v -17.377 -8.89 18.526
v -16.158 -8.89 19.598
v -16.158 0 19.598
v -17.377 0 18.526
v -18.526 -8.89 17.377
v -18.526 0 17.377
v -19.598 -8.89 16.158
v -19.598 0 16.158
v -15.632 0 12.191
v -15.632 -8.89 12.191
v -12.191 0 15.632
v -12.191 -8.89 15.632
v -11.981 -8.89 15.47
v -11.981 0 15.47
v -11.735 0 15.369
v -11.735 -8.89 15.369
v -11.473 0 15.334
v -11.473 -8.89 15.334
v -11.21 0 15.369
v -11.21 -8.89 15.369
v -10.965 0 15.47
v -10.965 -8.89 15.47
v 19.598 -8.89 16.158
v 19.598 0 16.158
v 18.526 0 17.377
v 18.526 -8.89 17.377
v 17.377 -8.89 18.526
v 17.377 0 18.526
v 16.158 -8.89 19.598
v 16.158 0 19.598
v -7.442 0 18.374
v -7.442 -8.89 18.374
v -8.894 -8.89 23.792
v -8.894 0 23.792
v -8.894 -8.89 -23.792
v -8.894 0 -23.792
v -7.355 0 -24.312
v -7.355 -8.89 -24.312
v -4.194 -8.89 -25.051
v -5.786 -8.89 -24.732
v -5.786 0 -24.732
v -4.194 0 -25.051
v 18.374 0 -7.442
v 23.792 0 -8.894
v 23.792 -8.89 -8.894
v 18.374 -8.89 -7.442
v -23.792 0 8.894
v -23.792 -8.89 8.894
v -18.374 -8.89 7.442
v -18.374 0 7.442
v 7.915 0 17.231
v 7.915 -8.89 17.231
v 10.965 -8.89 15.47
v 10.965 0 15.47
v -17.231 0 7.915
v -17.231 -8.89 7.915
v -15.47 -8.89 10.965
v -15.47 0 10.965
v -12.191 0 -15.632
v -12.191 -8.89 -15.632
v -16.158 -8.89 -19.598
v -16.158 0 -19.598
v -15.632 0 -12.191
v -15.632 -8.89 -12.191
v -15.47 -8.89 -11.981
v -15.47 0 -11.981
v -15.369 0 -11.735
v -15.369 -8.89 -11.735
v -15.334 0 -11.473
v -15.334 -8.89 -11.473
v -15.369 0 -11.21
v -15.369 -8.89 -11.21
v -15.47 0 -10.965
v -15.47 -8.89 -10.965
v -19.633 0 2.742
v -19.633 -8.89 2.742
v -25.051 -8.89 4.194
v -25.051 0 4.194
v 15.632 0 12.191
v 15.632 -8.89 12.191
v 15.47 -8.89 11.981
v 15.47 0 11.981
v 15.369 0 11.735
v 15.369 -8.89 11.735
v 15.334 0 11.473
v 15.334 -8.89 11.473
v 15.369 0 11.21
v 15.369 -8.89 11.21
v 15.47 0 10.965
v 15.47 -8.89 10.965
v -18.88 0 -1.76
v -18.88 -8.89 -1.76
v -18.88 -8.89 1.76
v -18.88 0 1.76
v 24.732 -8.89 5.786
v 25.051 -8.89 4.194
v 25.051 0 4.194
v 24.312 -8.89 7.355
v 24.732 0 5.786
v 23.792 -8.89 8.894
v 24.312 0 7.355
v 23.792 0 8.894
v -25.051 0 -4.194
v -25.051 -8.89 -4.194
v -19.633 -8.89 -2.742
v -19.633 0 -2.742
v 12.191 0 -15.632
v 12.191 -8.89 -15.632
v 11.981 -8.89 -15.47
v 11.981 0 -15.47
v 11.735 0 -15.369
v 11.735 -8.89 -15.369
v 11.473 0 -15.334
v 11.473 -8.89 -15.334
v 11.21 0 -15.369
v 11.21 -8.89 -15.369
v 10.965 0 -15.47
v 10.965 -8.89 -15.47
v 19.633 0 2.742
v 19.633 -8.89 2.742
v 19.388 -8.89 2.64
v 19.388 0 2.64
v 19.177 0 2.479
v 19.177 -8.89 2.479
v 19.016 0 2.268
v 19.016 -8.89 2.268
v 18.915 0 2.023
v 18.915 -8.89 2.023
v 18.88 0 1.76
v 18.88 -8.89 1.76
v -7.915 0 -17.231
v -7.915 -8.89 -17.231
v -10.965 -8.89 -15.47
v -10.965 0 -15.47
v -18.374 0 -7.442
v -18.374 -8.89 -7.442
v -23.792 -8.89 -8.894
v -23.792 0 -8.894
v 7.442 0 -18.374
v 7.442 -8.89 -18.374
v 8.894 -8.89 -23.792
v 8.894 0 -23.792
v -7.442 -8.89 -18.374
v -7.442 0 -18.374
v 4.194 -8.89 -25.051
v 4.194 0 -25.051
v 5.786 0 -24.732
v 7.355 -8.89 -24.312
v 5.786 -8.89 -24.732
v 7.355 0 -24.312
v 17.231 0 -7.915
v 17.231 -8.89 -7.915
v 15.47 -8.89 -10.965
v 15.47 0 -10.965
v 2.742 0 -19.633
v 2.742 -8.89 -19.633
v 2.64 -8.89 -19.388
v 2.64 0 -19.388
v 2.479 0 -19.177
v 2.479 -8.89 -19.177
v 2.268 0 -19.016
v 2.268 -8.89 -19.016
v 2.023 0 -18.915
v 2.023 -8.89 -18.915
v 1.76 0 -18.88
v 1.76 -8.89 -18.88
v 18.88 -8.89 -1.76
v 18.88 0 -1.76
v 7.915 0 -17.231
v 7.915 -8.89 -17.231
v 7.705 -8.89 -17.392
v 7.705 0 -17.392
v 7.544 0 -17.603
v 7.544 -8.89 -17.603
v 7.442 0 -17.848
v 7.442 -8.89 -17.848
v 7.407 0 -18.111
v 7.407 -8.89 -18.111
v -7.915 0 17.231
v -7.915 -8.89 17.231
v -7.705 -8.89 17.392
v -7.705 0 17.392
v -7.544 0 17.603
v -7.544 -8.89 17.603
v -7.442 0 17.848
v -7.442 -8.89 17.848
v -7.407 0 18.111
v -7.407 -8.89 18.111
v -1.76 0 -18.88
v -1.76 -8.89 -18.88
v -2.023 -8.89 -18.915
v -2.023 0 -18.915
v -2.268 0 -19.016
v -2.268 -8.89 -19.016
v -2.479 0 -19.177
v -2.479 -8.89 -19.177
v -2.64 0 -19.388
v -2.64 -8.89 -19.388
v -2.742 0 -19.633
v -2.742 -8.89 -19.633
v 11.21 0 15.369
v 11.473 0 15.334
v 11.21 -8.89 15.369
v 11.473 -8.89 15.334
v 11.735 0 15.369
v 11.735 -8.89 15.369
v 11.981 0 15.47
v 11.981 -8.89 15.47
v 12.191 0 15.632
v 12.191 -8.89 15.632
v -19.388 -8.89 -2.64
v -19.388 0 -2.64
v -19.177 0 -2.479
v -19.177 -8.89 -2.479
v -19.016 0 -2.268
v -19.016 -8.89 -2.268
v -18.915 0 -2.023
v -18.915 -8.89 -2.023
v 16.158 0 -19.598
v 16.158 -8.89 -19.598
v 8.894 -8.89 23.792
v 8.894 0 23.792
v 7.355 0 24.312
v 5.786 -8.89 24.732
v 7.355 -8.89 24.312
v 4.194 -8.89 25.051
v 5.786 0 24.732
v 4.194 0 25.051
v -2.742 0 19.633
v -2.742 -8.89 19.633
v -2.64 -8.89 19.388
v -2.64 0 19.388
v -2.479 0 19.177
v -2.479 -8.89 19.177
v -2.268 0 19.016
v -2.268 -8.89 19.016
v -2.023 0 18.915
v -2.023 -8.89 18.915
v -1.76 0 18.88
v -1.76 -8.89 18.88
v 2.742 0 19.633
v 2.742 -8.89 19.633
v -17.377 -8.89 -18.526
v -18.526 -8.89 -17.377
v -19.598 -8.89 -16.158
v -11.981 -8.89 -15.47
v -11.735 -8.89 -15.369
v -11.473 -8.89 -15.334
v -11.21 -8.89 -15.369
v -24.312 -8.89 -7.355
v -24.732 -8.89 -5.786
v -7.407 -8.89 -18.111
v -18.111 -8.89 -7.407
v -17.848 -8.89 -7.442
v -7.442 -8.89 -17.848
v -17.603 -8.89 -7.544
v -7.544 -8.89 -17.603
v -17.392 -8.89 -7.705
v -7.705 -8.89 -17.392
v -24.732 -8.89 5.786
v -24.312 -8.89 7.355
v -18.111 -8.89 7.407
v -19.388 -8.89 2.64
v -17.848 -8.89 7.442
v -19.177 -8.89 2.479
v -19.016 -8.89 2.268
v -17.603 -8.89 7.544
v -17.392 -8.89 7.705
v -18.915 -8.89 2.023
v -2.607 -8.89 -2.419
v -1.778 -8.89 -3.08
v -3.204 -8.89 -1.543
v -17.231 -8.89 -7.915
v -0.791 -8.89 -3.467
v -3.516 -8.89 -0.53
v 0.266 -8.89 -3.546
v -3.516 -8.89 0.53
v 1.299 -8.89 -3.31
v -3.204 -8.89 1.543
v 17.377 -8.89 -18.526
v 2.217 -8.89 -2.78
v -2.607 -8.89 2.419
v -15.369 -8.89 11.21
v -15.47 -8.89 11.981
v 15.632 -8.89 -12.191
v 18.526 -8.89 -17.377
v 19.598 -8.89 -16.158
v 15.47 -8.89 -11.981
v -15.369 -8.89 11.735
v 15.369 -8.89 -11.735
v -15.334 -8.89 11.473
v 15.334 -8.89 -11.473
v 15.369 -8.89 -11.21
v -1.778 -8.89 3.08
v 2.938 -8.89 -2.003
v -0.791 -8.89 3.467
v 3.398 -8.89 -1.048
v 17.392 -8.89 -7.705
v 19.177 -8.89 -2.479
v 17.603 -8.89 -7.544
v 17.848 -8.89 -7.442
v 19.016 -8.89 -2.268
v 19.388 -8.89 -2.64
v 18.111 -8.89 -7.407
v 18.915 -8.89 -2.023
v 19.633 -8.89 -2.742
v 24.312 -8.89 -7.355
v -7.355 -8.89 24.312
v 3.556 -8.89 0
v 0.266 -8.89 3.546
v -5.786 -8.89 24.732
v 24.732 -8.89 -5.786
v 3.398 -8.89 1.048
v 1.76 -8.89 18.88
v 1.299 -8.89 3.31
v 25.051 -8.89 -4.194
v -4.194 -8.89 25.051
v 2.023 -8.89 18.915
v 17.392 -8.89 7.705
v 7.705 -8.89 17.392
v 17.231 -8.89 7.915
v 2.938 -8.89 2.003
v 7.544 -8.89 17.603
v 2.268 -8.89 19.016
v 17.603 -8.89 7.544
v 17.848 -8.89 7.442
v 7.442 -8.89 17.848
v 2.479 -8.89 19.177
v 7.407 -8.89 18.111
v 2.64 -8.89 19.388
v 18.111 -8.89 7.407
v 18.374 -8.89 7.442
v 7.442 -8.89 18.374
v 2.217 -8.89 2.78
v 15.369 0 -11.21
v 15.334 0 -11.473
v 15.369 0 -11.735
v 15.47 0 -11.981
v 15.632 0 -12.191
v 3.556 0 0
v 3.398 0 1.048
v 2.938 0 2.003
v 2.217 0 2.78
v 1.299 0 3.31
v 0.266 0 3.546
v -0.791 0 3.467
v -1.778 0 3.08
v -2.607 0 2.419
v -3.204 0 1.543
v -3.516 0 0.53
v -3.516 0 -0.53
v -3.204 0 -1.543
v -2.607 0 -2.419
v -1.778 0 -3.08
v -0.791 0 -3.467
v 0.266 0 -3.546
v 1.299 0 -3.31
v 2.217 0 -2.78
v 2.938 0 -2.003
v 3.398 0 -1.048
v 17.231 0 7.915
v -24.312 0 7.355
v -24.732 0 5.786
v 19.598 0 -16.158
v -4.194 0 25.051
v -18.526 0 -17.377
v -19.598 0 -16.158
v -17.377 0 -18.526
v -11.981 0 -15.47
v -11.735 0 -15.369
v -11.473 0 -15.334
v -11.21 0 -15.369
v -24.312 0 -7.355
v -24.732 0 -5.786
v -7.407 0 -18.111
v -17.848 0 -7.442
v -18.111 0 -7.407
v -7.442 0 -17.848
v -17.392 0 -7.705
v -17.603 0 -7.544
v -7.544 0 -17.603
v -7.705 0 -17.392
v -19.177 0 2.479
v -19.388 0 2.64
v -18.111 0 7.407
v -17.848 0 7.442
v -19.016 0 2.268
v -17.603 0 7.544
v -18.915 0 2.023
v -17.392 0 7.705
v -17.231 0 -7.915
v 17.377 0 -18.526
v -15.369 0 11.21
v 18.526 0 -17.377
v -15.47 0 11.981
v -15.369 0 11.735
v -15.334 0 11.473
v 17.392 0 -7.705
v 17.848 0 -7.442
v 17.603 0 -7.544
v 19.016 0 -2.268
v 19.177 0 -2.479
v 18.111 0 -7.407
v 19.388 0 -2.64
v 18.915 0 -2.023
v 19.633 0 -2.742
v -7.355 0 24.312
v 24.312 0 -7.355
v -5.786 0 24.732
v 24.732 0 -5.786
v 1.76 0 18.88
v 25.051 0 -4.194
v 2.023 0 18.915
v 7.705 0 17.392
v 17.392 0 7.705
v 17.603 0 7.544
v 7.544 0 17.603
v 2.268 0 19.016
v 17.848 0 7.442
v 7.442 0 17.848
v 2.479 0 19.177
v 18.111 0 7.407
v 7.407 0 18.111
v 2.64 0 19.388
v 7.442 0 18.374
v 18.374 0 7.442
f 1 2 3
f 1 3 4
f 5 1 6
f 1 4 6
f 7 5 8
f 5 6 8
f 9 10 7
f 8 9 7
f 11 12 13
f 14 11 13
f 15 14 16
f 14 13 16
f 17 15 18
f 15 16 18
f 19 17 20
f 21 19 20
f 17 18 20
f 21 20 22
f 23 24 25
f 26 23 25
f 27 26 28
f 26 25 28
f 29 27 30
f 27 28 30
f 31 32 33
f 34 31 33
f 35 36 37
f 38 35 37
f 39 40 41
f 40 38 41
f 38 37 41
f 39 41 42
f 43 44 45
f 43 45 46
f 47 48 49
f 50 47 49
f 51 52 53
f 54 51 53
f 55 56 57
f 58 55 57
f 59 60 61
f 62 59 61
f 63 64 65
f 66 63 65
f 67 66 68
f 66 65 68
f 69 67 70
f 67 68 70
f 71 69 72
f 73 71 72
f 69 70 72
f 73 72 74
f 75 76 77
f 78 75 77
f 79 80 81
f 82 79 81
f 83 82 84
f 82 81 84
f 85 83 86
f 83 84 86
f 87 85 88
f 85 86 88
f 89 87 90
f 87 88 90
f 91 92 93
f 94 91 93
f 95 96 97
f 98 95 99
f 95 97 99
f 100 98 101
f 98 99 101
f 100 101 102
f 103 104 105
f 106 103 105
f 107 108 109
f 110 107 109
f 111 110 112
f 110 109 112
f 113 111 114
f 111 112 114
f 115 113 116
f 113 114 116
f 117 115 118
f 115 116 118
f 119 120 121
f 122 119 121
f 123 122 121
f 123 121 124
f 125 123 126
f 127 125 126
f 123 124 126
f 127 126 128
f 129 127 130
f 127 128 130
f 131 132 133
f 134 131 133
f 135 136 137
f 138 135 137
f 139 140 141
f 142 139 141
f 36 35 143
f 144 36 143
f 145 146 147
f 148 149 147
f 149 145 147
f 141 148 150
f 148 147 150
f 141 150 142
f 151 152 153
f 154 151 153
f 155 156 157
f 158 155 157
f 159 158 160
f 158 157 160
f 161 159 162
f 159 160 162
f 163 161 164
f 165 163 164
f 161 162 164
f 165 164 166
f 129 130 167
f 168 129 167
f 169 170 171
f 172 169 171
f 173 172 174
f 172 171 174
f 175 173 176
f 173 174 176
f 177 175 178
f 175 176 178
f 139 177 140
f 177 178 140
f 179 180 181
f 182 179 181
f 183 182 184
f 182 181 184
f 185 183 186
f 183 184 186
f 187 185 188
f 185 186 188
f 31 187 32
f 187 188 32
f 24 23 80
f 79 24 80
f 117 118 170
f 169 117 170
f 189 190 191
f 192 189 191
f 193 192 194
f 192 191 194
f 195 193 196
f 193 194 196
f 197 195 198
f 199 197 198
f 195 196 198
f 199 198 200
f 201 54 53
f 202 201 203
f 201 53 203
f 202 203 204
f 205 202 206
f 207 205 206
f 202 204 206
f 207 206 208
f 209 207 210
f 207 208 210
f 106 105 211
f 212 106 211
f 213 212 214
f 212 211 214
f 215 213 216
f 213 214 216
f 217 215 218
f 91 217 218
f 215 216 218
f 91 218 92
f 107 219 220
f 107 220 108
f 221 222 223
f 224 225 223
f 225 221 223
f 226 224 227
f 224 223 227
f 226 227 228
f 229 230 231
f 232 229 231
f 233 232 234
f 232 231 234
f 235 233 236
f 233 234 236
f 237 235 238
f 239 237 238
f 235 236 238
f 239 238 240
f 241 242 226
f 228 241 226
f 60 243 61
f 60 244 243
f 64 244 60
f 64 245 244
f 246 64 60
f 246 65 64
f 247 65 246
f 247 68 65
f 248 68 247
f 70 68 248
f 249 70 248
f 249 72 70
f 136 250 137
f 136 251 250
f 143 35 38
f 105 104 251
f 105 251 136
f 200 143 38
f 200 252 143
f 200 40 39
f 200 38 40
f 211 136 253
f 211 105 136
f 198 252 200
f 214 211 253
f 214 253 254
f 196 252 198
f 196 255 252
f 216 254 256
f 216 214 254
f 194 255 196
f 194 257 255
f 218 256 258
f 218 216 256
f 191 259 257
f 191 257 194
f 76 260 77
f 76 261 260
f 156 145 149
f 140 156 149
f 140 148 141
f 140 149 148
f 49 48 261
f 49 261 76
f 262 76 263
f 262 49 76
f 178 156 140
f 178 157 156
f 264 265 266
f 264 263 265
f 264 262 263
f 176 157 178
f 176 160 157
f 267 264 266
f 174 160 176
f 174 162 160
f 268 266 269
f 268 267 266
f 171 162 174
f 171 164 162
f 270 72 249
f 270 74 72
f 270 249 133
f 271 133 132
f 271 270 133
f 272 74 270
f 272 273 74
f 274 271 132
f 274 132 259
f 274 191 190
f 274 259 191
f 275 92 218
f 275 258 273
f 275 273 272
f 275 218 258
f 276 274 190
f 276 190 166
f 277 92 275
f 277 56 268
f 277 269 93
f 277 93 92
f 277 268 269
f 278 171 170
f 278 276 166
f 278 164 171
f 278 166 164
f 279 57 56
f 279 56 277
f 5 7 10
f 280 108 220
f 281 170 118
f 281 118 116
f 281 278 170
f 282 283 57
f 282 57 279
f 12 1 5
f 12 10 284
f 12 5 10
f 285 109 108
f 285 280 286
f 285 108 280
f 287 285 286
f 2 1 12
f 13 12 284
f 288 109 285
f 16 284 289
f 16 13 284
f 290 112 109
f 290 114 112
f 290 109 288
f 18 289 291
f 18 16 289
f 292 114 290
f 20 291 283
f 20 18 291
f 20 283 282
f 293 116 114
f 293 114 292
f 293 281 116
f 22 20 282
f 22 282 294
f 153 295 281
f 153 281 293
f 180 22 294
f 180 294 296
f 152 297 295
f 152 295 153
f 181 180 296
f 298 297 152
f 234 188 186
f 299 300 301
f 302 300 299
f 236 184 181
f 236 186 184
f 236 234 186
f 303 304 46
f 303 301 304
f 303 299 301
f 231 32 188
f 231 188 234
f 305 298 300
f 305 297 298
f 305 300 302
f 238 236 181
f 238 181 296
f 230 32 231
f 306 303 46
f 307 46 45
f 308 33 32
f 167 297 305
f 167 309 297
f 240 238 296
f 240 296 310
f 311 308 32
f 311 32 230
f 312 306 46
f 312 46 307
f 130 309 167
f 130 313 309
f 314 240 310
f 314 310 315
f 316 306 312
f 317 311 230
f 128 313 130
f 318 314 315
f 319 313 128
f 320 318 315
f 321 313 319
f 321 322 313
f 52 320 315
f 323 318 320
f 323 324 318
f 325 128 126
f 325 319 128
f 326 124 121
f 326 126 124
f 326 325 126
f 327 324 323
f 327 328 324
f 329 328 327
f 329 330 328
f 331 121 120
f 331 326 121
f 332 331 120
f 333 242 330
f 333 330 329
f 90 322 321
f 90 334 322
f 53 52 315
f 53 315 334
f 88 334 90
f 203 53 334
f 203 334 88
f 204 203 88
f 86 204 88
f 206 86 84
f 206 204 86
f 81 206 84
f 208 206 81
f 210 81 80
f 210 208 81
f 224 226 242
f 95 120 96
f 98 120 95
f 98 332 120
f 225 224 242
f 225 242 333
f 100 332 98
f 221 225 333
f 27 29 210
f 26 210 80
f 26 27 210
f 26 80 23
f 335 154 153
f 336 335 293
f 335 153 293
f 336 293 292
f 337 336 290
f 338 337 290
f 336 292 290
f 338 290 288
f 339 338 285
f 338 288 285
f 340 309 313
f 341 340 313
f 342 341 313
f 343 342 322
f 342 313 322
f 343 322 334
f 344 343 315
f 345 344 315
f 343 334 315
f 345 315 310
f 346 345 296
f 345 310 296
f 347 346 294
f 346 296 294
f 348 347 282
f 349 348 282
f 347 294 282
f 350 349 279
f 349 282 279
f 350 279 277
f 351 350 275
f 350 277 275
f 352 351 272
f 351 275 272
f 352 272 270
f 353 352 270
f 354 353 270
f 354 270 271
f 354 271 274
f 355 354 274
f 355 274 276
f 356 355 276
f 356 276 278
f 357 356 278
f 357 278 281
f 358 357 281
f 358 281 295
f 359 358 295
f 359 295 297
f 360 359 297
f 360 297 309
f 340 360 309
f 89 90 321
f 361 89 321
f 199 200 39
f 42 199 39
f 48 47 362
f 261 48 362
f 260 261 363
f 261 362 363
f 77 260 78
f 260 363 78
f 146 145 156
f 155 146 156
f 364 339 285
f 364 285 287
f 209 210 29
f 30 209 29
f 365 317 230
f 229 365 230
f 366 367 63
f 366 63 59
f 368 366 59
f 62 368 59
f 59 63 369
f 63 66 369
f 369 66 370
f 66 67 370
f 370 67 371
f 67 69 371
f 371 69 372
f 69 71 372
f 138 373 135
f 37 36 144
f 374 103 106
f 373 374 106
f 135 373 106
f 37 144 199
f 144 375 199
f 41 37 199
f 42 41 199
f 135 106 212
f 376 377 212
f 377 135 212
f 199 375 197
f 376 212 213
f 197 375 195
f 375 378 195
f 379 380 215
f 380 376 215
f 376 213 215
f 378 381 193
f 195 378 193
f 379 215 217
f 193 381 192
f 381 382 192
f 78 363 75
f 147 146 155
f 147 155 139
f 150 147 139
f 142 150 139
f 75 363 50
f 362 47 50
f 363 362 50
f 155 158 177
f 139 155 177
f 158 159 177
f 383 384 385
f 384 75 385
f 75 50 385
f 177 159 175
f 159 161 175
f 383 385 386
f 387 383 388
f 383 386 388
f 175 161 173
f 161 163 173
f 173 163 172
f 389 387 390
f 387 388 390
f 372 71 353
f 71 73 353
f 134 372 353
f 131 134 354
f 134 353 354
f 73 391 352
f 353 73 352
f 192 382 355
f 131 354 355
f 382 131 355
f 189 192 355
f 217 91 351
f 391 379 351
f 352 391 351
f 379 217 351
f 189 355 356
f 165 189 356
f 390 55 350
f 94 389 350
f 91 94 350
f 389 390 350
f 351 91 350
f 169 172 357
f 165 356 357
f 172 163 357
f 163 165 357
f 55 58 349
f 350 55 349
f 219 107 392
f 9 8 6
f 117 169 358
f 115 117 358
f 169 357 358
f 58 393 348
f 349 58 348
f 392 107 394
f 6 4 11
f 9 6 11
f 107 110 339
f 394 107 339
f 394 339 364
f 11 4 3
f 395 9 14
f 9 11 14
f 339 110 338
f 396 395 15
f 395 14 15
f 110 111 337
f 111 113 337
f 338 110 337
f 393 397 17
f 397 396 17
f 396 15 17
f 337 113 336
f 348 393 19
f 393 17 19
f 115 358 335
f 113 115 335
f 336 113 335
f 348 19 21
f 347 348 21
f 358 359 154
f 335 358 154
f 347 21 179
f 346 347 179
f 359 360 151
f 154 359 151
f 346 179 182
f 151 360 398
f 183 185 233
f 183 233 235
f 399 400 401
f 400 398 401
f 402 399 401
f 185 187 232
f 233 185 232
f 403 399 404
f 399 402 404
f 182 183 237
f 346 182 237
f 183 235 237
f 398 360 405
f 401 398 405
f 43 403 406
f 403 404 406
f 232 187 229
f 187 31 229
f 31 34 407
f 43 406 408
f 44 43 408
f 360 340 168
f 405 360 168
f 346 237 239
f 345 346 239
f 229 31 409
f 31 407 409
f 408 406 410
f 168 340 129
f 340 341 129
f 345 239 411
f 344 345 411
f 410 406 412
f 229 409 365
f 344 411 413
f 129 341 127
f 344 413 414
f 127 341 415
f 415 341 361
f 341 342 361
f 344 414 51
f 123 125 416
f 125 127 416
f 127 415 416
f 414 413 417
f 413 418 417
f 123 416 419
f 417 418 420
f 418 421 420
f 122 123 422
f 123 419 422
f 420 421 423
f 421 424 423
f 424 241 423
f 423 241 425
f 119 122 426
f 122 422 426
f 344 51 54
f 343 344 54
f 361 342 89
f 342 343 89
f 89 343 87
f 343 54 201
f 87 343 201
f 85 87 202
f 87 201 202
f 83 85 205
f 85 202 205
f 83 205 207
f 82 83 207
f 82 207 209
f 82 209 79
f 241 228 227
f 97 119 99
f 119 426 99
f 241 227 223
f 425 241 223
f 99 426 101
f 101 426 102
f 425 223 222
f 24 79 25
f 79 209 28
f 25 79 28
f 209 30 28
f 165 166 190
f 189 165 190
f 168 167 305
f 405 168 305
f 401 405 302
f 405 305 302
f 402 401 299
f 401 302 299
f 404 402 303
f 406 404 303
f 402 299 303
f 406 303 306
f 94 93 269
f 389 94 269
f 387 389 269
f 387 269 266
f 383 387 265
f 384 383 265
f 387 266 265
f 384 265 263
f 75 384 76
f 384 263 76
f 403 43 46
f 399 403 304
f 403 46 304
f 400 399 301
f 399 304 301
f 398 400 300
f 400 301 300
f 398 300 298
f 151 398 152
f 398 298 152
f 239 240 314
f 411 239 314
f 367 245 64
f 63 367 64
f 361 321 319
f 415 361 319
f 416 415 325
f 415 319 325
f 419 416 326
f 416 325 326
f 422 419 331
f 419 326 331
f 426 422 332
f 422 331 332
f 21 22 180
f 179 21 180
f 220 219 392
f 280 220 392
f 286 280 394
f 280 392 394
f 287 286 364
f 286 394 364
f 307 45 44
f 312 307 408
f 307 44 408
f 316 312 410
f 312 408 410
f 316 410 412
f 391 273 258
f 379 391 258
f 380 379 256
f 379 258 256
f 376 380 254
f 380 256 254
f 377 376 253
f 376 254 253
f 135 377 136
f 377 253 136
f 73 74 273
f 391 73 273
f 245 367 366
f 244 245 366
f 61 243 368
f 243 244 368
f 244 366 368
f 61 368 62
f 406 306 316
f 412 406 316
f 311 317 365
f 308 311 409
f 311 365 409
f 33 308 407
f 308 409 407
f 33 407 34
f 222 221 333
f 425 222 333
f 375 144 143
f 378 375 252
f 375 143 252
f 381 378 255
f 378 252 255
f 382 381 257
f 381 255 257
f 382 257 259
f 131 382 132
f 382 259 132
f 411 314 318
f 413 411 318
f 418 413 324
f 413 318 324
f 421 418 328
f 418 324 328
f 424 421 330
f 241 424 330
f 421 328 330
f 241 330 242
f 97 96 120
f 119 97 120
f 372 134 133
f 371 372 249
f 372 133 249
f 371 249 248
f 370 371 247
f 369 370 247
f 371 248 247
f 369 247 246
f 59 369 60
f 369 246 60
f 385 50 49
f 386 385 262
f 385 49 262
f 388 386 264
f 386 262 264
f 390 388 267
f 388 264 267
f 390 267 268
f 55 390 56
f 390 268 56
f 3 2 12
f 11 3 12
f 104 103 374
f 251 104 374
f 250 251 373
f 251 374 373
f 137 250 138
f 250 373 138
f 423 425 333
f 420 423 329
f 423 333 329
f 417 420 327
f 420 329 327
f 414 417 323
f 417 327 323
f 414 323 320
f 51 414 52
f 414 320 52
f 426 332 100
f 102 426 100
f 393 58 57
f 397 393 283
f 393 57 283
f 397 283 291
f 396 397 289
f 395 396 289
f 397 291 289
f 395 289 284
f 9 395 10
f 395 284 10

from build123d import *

# Parameters (mm, degrees)
F0_R     = 25.4
F1_DEPTH = 8.89
F3_DEPTH = 25.4
F4_COUNT = 12
F4_ANGLE = 330
F5_R     = 3.556
F6_DEPTH = 25.4


with BuildPart() as f1:
    # F0 (on Front) → F1 (new body)
    with BuildSketch(Plane.XZ):
        Circle(F0_R)
    extrude(amount=F1_DEPTH)

    # F2 (on face) → F3 (cut)
    with BuildSketch(Plane.XZ.offset(8.89)):
        with BuildLine():
            ThreePointArc((1.7603957802, 18.8799073091), (2.3788973921, 19.0898603154), (2.7417764197, 19.6329471593))
            Line((2.7417764197, 19.6329471593), (4.19365, 25.0514131273))
            ThreePointArc((4.19365, 25.0514131274), (0, 25.4), (-4.19365, 25.0514131274))
            Line((-4.19365, 25.0514131273), (-2.7417764197, 19.6329471593))
            ThreePointArc((-2.7417764197, 19.6329471593), (-2.3788973921, 19.0898603154), (-1.7603957802, 18.8799073091))
            Line((-1.7603957802, 18.8799073091), (0, 18.8799073091))
            Line((0, 18.8799073091), (1.7603957802, 18.8799073091))
        make_face()
    f3 = extrude(amount=-F3_DEPTH, mode=Mode.SUBTRACT)

    # F4: F3 ×12 about axis
    f4_axis = Axis((0, 0, 0), (0, 1, 0))
    for i in range(1, F4_COUNT):
        add(f3.rotate(f4_axis, i * F4_ANGLE / (F4_COUNT - 1)), mode=Mode.SUBTRACT)

    # F5 (on face) → F6 (cut)
    with BuildSketch(Plane.XZ.offset(8.89)):
        Circle(F5_R)
    extrude(amount=-F6_DEPTH, mode=Mode.SUBTRACT)


solid = f1.part
